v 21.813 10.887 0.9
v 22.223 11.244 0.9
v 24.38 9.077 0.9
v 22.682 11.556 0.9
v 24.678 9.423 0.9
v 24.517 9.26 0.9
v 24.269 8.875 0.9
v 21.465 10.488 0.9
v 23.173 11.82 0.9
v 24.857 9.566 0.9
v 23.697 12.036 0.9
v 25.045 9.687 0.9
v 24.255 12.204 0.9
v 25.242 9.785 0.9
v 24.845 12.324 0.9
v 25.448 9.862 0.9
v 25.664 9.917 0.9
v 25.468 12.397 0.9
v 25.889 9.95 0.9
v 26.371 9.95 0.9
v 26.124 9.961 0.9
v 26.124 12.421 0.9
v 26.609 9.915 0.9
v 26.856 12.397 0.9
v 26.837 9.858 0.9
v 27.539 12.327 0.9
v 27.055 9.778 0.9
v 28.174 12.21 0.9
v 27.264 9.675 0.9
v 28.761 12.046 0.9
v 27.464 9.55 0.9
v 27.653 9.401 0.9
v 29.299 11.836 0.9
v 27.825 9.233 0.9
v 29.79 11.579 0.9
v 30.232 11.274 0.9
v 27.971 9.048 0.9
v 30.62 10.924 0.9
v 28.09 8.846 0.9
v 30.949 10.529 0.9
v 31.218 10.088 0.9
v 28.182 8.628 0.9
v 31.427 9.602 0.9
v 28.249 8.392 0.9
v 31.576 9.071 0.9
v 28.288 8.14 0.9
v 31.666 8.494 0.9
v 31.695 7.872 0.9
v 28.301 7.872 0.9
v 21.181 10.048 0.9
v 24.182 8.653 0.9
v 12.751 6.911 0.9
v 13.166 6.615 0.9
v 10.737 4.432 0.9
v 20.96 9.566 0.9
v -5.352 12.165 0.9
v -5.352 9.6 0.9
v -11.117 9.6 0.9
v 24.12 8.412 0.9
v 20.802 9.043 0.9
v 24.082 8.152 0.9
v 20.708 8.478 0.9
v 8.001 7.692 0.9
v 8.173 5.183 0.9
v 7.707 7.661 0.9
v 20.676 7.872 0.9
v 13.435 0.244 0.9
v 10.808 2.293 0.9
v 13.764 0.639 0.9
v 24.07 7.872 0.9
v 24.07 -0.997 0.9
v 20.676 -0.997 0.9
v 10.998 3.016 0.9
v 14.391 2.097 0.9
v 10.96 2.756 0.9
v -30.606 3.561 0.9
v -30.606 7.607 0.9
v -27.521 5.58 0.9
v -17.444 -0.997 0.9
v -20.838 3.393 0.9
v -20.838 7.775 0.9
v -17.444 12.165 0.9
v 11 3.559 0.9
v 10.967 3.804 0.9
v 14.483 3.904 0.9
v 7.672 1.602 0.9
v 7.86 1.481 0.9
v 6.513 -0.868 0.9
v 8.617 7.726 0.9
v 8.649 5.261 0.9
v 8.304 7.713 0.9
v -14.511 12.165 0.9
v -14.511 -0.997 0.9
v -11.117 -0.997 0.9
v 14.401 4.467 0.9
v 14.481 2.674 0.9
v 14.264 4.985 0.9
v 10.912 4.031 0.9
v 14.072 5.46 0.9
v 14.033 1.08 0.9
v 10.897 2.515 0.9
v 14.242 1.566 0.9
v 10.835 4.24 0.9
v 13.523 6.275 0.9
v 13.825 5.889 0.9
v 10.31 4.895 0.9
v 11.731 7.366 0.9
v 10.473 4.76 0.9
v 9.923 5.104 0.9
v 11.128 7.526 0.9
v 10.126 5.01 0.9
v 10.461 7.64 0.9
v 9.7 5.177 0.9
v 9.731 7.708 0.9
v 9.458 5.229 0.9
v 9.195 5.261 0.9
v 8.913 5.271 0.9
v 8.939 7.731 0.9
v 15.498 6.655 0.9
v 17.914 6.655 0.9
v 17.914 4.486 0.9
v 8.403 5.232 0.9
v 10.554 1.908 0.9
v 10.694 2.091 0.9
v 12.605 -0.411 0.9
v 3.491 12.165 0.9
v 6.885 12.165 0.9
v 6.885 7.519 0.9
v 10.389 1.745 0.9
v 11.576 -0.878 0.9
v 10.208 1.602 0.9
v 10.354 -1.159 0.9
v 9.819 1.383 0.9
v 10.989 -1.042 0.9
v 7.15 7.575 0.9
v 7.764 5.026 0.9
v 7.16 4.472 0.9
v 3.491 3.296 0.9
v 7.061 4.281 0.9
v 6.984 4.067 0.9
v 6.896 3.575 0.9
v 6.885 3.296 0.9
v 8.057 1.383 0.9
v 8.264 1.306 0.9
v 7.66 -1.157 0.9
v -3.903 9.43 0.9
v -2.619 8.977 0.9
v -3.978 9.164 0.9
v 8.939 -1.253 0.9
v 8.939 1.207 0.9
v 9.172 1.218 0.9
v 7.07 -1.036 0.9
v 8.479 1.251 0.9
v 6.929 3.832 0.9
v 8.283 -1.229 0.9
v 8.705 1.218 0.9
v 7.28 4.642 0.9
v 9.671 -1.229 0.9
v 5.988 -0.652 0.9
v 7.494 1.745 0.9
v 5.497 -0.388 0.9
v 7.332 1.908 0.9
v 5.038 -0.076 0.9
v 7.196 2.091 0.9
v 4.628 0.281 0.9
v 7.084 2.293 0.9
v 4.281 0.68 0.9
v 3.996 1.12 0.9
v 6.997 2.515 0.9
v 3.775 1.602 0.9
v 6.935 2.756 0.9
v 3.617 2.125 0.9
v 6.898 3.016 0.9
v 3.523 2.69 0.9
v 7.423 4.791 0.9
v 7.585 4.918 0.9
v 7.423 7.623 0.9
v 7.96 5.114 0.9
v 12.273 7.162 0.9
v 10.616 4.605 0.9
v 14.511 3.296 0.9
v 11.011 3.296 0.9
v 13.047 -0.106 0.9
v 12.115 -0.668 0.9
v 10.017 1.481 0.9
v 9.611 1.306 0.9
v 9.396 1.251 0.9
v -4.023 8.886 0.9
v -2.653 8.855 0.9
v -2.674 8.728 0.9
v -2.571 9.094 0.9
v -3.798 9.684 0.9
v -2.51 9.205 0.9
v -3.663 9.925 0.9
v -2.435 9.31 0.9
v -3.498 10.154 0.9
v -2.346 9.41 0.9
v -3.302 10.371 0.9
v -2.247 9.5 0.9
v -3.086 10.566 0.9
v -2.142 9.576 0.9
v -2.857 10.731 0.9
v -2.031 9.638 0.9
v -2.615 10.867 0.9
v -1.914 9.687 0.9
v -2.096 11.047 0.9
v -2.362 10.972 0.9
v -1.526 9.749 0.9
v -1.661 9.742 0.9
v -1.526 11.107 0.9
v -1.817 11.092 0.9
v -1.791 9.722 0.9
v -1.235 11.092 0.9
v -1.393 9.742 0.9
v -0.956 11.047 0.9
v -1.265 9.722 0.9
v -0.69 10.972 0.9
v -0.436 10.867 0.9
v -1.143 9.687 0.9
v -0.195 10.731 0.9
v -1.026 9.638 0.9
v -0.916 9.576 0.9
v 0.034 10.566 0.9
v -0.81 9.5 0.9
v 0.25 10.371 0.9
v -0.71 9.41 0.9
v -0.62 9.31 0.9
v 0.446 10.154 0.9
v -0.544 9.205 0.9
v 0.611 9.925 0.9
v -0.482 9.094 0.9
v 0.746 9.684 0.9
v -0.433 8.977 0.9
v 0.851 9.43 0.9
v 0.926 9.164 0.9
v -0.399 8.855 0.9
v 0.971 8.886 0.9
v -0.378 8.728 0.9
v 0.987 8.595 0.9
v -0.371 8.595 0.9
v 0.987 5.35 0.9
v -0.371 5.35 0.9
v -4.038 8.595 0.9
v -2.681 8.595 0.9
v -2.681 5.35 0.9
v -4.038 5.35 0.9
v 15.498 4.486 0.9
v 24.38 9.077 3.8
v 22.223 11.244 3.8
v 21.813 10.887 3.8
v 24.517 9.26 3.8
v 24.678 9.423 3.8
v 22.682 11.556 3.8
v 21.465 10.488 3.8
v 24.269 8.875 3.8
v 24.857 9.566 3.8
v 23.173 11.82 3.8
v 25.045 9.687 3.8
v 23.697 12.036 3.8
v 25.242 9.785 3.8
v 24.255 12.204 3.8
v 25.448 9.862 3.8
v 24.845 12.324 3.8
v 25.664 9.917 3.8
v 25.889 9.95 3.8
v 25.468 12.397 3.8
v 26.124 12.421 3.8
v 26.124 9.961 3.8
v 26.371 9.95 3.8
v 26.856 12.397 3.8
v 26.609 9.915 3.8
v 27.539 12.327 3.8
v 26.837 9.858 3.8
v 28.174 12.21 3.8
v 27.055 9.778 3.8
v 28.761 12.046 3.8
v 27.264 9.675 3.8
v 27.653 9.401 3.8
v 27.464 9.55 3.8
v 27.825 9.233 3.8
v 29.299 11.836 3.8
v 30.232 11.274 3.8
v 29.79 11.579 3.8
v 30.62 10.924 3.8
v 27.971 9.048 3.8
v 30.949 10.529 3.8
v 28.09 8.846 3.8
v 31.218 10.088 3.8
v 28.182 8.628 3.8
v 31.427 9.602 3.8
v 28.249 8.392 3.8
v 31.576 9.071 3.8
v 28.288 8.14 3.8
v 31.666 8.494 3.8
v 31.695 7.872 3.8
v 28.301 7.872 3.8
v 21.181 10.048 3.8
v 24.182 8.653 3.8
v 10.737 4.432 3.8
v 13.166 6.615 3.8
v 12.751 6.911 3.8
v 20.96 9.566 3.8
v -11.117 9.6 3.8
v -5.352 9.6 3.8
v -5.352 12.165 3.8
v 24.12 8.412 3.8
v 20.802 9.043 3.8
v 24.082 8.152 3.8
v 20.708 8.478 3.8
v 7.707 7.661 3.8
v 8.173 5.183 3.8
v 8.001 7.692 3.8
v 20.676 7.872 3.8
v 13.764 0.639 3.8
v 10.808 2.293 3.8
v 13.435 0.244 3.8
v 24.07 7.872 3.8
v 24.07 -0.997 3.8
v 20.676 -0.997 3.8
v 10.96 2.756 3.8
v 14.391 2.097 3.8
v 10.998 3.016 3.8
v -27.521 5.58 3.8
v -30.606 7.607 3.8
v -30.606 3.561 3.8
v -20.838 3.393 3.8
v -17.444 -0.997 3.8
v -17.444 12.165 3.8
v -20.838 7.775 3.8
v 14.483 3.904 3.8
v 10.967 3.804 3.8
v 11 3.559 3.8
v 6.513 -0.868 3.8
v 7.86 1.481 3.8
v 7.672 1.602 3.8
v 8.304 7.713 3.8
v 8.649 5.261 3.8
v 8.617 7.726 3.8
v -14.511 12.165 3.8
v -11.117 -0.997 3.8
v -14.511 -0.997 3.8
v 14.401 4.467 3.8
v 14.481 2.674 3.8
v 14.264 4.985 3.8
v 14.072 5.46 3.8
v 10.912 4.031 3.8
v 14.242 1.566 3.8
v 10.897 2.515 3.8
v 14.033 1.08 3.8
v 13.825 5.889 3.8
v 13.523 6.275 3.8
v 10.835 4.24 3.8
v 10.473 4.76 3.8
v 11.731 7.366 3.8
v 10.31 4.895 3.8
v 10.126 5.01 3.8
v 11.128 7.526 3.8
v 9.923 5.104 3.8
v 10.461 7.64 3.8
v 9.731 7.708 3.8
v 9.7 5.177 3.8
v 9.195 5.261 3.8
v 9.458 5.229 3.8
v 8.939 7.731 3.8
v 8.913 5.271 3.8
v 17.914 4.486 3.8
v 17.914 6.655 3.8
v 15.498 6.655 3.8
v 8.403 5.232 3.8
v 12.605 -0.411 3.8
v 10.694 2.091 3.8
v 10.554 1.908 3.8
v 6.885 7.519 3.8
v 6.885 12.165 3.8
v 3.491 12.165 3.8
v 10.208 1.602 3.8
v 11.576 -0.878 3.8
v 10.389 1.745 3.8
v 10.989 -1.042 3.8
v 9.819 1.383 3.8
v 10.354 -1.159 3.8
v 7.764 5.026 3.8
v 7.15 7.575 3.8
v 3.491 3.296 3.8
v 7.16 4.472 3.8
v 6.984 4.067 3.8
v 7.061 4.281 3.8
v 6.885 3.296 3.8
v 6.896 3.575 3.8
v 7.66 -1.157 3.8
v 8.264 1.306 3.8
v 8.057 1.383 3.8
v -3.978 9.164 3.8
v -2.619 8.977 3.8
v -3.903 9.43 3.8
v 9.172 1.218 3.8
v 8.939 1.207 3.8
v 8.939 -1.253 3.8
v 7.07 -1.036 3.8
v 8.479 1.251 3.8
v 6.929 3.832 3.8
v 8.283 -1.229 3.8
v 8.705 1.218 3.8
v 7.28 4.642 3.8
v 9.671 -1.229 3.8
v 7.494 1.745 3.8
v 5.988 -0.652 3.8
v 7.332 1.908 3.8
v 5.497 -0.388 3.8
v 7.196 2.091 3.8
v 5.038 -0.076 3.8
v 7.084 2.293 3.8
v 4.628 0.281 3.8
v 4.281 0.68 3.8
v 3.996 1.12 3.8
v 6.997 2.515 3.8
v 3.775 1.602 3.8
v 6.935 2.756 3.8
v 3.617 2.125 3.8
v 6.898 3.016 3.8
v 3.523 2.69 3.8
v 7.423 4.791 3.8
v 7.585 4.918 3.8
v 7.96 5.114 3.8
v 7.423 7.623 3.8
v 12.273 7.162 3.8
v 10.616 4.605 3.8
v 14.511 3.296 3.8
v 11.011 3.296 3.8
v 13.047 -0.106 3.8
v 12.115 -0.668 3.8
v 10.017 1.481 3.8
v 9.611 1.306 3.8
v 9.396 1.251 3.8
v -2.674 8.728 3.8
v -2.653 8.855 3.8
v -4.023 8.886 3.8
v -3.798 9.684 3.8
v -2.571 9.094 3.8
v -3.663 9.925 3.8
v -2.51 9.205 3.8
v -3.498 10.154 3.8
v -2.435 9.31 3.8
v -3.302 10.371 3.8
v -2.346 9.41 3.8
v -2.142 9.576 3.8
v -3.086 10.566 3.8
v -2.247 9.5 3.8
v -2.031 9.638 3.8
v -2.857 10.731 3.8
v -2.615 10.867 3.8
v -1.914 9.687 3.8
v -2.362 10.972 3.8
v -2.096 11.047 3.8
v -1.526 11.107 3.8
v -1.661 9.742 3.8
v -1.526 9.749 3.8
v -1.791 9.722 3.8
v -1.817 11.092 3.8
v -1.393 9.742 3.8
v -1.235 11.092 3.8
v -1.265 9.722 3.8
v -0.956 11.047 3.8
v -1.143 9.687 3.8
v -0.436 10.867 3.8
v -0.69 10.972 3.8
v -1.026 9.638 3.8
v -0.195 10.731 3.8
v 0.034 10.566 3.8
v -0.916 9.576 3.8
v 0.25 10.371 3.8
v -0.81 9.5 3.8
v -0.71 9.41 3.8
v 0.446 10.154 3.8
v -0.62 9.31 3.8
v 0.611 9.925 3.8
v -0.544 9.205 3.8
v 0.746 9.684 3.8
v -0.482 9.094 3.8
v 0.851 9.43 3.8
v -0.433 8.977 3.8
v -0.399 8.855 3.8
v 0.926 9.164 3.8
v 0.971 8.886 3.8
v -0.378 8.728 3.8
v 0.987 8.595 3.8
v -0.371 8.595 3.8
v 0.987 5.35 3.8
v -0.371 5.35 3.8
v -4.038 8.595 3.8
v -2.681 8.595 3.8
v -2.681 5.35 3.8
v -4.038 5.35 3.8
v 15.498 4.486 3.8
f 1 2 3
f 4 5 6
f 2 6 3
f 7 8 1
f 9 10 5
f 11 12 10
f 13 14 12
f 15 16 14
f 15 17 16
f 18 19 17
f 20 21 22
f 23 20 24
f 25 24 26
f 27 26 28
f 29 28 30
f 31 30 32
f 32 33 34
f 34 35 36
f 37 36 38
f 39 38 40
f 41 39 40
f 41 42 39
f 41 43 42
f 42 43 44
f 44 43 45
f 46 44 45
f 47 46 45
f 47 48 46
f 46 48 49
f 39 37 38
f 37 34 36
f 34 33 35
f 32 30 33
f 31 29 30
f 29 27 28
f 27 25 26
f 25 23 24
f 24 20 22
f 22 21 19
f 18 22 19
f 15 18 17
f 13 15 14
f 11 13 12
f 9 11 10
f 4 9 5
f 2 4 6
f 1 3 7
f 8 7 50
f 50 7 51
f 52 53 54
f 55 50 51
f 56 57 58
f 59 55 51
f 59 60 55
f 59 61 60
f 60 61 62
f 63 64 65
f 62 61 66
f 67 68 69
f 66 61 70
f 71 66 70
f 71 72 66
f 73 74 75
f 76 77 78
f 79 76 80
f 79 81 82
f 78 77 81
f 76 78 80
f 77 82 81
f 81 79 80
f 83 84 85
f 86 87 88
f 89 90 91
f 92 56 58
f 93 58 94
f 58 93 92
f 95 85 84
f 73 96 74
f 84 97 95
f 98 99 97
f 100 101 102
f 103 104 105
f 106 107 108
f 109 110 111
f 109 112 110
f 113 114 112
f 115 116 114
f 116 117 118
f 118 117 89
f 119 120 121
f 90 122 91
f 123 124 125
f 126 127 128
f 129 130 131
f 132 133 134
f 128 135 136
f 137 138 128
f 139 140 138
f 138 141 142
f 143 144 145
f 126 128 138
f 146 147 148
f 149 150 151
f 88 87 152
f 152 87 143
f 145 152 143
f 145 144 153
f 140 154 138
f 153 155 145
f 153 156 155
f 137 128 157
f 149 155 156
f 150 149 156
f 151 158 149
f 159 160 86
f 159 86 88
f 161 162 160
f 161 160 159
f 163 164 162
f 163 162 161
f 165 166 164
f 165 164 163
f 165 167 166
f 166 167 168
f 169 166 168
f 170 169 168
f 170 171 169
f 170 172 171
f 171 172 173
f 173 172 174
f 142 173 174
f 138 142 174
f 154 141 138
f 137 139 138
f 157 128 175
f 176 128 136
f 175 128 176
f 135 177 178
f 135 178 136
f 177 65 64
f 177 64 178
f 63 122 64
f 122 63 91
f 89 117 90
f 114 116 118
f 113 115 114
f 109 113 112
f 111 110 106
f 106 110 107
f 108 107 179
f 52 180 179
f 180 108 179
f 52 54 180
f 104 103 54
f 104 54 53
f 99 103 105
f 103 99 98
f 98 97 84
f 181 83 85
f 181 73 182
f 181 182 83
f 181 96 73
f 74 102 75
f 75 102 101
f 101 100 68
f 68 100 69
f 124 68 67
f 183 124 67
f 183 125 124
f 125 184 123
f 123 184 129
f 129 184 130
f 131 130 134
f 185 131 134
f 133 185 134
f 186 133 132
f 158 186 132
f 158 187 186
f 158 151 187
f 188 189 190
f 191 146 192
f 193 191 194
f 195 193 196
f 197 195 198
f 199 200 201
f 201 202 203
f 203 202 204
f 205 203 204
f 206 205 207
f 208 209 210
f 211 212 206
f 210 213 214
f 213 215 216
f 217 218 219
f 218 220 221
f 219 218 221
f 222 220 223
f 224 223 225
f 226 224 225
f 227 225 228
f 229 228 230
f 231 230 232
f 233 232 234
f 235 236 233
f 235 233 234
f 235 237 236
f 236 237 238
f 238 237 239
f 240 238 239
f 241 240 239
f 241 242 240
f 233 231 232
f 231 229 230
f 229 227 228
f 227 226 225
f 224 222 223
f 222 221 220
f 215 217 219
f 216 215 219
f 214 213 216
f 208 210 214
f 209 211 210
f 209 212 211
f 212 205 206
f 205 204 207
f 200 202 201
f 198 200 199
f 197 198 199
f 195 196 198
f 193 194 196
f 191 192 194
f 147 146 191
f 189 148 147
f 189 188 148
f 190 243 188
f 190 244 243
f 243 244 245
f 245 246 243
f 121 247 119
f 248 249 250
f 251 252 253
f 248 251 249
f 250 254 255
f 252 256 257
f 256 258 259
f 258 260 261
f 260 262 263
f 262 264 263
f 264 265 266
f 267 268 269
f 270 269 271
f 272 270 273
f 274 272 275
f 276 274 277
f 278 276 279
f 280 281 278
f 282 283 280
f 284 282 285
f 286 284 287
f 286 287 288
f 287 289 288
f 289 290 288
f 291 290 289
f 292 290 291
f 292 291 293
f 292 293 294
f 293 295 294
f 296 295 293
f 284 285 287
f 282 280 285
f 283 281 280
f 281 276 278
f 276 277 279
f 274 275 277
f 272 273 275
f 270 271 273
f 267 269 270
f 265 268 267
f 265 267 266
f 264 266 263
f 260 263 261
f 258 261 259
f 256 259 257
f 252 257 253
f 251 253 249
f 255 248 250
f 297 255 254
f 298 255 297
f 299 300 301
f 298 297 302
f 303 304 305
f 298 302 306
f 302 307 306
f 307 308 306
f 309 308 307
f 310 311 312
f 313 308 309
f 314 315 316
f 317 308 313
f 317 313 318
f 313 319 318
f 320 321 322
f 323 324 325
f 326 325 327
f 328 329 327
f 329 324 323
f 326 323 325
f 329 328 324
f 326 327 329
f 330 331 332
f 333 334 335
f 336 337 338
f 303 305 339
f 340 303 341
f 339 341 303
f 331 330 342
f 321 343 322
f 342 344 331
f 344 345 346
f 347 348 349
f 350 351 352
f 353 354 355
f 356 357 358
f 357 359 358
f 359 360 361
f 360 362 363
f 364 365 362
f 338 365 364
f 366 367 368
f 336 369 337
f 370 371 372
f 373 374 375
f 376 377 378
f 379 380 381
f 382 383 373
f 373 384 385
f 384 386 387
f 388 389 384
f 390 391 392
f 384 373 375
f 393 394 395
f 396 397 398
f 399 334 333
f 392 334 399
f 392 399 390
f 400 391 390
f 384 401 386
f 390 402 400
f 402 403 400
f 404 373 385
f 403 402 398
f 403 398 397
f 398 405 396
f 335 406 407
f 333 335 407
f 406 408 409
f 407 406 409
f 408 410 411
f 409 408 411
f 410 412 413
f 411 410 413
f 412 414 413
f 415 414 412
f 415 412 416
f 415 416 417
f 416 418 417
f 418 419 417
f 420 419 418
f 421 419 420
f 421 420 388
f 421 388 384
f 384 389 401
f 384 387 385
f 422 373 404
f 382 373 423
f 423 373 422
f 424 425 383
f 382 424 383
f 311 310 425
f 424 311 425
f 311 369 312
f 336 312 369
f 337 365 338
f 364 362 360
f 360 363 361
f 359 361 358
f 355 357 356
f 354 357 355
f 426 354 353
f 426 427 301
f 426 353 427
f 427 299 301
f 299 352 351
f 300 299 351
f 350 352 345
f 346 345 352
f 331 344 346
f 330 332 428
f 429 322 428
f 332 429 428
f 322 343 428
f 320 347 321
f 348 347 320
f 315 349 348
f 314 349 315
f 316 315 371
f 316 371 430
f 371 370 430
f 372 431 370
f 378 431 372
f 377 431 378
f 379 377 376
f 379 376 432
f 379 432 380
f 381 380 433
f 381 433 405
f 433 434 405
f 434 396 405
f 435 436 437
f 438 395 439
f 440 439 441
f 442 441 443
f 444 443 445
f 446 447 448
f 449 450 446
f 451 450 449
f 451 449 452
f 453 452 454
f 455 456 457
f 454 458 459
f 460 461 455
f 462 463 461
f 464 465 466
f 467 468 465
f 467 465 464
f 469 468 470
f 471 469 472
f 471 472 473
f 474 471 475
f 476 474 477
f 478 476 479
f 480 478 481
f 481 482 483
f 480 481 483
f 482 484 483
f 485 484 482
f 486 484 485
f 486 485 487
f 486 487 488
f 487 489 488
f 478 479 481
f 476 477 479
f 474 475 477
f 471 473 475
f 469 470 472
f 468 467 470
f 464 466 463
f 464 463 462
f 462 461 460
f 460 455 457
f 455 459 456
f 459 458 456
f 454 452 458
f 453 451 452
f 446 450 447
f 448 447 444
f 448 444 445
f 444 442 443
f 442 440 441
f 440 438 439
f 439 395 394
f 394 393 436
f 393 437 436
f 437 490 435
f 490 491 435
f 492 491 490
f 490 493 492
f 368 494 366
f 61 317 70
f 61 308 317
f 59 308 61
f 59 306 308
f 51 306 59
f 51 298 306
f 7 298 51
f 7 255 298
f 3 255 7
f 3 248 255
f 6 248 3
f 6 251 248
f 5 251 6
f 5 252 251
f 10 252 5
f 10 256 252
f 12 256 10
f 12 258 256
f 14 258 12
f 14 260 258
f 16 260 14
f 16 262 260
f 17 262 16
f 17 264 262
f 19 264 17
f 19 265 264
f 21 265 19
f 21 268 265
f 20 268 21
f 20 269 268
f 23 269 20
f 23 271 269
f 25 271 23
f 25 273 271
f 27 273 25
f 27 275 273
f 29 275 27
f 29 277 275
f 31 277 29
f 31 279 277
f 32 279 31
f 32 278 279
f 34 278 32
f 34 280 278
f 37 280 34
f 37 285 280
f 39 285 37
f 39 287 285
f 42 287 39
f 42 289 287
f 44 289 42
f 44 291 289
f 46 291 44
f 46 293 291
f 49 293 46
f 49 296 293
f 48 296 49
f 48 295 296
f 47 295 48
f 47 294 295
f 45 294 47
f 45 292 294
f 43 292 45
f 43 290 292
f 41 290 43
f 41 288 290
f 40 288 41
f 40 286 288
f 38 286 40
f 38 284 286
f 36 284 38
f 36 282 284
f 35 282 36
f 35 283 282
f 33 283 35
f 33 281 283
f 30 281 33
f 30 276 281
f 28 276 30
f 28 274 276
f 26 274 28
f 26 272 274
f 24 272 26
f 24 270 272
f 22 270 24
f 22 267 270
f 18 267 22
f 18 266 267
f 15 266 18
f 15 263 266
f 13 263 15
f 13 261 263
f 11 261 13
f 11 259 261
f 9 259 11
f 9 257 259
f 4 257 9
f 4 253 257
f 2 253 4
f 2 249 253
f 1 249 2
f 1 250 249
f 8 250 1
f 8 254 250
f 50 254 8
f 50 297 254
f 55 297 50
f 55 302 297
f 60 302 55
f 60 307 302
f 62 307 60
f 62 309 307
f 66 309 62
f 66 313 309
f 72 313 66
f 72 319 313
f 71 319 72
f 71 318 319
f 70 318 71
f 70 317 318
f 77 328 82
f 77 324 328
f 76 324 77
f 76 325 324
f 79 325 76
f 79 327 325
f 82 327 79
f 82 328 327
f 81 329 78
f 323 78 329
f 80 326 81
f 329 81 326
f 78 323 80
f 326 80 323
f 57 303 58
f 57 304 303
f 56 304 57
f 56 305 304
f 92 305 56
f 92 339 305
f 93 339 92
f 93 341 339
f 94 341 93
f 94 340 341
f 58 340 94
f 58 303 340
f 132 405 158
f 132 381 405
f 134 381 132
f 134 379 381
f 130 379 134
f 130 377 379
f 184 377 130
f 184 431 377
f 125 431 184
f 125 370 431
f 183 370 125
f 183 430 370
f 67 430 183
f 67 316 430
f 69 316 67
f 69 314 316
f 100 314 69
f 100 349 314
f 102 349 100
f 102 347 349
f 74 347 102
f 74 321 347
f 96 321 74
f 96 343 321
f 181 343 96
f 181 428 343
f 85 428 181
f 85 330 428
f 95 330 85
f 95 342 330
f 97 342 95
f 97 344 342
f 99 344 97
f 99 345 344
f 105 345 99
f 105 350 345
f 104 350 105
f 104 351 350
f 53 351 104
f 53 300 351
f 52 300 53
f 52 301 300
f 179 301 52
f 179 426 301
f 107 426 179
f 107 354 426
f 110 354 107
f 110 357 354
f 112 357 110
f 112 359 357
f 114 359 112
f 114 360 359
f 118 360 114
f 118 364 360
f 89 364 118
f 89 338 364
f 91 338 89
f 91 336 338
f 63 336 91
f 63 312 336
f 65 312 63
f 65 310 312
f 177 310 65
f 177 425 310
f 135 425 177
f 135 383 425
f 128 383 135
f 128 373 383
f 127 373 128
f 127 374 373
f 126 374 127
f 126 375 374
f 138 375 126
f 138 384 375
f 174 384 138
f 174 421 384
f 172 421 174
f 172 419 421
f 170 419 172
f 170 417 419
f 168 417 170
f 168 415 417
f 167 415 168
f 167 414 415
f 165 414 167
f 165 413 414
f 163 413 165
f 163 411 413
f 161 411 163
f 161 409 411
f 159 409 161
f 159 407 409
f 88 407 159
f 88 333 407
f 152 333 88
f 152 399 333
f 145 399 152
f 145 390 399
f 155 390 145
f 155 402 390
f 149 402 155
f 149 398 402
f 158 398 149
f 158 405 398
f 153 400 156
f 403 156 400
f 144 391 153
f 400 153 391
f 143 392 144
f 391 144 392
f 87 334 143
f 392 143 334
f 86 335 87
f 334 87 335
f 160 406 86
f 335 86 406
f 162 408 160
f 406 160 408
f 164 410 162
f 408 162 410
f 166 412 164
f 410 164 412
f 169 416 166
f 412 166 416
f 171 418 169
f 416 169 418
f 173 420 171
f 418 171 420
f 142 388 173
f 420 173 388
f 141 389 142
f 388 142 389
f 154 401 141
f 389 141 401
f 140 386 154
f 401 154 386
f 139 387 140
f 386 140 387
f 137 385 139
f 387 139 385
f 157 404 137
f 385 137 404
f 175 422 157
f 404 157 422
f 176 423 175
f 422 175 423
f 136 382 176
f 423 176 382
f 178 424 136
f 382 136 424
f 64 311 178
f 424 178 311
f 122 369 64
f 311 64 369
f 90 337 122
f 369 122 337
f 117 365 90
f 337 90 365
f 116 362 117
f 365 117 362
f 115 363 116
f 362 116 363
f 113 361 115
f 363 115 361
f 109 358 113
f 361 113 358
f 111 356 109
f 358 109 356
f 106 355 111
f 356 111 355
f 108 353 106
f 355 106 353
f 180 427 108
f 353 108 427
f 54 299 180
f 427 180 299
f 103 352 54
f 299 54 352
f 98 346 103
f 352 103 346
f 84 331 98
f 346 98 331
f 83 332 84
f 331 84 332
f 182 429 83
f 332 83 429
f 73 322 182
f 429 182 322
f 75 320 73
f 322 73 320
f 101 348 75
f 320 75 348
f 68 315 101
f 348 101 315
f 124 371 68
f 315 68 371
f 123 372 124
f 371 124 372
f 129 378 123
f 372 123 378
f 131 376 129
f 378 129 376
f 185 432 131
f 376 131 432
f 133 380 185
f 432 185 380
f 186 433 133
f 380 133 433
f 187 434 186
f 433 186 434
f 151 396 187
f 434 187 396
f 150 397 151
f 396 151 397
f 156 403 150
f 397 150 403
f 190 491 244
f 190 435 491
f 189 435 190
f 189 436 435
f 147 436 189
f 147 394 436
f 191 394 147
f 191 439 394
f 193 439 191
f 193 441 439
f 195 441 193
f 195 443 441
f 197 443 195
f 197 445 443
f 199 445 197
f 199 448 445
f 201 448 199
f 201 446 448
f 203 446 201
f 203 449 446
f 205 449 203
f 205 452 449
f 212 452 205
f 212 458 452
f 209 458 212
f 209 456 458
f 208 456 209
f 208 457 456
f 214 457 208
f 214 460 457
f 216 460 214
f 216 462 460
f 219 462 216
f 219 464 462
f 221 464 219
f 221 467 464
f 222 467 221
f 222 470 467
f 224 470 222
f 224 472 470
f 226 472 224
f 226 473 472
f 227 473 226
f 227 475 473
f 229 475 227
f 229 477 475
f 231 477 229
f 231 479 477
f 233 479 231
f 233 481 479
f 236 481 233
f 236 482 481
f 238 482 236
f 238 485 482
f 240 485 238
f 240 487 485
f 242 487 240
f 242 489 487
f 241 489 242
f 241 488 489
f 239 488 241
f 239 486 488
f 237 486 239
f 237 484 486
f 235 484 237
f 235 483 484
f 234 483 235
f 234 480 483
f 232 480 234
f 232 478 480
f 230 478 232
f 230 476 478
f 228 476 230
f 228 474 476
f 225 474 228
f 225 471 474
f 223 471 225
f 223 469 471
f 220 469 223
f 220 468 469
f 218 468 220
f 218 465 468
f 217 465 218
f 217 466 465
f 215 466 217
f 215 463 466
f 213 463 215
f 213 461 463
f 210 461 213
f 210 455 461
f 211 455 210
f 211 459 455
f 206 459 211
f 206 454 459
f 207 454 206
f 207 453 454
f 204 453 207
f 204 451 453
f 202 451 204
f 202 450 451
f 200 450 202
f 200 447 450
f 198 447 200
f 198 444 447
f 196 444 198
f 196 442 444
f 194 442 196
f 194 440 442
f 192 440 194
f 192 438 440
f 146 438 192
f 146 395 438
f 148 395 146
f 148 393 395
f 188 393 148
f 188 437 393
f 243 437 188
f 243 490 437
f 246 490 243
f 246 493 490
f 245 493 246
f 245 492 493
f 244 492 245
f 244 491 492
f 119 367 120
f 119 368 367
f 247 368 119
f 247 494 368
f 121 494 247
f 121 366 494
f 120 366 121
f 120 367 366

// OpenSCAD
$fn = 48;
  // syllabics (overlaid on icon, tallest) — row 1
  translate([0, 5.430, 0.900]) linear_extrude(height=2.900) text("ᐊᒥᐢᑿᒋ", size=13.000, halign="center", valign="center", font="Euphemia UCAS:style=Bold");
